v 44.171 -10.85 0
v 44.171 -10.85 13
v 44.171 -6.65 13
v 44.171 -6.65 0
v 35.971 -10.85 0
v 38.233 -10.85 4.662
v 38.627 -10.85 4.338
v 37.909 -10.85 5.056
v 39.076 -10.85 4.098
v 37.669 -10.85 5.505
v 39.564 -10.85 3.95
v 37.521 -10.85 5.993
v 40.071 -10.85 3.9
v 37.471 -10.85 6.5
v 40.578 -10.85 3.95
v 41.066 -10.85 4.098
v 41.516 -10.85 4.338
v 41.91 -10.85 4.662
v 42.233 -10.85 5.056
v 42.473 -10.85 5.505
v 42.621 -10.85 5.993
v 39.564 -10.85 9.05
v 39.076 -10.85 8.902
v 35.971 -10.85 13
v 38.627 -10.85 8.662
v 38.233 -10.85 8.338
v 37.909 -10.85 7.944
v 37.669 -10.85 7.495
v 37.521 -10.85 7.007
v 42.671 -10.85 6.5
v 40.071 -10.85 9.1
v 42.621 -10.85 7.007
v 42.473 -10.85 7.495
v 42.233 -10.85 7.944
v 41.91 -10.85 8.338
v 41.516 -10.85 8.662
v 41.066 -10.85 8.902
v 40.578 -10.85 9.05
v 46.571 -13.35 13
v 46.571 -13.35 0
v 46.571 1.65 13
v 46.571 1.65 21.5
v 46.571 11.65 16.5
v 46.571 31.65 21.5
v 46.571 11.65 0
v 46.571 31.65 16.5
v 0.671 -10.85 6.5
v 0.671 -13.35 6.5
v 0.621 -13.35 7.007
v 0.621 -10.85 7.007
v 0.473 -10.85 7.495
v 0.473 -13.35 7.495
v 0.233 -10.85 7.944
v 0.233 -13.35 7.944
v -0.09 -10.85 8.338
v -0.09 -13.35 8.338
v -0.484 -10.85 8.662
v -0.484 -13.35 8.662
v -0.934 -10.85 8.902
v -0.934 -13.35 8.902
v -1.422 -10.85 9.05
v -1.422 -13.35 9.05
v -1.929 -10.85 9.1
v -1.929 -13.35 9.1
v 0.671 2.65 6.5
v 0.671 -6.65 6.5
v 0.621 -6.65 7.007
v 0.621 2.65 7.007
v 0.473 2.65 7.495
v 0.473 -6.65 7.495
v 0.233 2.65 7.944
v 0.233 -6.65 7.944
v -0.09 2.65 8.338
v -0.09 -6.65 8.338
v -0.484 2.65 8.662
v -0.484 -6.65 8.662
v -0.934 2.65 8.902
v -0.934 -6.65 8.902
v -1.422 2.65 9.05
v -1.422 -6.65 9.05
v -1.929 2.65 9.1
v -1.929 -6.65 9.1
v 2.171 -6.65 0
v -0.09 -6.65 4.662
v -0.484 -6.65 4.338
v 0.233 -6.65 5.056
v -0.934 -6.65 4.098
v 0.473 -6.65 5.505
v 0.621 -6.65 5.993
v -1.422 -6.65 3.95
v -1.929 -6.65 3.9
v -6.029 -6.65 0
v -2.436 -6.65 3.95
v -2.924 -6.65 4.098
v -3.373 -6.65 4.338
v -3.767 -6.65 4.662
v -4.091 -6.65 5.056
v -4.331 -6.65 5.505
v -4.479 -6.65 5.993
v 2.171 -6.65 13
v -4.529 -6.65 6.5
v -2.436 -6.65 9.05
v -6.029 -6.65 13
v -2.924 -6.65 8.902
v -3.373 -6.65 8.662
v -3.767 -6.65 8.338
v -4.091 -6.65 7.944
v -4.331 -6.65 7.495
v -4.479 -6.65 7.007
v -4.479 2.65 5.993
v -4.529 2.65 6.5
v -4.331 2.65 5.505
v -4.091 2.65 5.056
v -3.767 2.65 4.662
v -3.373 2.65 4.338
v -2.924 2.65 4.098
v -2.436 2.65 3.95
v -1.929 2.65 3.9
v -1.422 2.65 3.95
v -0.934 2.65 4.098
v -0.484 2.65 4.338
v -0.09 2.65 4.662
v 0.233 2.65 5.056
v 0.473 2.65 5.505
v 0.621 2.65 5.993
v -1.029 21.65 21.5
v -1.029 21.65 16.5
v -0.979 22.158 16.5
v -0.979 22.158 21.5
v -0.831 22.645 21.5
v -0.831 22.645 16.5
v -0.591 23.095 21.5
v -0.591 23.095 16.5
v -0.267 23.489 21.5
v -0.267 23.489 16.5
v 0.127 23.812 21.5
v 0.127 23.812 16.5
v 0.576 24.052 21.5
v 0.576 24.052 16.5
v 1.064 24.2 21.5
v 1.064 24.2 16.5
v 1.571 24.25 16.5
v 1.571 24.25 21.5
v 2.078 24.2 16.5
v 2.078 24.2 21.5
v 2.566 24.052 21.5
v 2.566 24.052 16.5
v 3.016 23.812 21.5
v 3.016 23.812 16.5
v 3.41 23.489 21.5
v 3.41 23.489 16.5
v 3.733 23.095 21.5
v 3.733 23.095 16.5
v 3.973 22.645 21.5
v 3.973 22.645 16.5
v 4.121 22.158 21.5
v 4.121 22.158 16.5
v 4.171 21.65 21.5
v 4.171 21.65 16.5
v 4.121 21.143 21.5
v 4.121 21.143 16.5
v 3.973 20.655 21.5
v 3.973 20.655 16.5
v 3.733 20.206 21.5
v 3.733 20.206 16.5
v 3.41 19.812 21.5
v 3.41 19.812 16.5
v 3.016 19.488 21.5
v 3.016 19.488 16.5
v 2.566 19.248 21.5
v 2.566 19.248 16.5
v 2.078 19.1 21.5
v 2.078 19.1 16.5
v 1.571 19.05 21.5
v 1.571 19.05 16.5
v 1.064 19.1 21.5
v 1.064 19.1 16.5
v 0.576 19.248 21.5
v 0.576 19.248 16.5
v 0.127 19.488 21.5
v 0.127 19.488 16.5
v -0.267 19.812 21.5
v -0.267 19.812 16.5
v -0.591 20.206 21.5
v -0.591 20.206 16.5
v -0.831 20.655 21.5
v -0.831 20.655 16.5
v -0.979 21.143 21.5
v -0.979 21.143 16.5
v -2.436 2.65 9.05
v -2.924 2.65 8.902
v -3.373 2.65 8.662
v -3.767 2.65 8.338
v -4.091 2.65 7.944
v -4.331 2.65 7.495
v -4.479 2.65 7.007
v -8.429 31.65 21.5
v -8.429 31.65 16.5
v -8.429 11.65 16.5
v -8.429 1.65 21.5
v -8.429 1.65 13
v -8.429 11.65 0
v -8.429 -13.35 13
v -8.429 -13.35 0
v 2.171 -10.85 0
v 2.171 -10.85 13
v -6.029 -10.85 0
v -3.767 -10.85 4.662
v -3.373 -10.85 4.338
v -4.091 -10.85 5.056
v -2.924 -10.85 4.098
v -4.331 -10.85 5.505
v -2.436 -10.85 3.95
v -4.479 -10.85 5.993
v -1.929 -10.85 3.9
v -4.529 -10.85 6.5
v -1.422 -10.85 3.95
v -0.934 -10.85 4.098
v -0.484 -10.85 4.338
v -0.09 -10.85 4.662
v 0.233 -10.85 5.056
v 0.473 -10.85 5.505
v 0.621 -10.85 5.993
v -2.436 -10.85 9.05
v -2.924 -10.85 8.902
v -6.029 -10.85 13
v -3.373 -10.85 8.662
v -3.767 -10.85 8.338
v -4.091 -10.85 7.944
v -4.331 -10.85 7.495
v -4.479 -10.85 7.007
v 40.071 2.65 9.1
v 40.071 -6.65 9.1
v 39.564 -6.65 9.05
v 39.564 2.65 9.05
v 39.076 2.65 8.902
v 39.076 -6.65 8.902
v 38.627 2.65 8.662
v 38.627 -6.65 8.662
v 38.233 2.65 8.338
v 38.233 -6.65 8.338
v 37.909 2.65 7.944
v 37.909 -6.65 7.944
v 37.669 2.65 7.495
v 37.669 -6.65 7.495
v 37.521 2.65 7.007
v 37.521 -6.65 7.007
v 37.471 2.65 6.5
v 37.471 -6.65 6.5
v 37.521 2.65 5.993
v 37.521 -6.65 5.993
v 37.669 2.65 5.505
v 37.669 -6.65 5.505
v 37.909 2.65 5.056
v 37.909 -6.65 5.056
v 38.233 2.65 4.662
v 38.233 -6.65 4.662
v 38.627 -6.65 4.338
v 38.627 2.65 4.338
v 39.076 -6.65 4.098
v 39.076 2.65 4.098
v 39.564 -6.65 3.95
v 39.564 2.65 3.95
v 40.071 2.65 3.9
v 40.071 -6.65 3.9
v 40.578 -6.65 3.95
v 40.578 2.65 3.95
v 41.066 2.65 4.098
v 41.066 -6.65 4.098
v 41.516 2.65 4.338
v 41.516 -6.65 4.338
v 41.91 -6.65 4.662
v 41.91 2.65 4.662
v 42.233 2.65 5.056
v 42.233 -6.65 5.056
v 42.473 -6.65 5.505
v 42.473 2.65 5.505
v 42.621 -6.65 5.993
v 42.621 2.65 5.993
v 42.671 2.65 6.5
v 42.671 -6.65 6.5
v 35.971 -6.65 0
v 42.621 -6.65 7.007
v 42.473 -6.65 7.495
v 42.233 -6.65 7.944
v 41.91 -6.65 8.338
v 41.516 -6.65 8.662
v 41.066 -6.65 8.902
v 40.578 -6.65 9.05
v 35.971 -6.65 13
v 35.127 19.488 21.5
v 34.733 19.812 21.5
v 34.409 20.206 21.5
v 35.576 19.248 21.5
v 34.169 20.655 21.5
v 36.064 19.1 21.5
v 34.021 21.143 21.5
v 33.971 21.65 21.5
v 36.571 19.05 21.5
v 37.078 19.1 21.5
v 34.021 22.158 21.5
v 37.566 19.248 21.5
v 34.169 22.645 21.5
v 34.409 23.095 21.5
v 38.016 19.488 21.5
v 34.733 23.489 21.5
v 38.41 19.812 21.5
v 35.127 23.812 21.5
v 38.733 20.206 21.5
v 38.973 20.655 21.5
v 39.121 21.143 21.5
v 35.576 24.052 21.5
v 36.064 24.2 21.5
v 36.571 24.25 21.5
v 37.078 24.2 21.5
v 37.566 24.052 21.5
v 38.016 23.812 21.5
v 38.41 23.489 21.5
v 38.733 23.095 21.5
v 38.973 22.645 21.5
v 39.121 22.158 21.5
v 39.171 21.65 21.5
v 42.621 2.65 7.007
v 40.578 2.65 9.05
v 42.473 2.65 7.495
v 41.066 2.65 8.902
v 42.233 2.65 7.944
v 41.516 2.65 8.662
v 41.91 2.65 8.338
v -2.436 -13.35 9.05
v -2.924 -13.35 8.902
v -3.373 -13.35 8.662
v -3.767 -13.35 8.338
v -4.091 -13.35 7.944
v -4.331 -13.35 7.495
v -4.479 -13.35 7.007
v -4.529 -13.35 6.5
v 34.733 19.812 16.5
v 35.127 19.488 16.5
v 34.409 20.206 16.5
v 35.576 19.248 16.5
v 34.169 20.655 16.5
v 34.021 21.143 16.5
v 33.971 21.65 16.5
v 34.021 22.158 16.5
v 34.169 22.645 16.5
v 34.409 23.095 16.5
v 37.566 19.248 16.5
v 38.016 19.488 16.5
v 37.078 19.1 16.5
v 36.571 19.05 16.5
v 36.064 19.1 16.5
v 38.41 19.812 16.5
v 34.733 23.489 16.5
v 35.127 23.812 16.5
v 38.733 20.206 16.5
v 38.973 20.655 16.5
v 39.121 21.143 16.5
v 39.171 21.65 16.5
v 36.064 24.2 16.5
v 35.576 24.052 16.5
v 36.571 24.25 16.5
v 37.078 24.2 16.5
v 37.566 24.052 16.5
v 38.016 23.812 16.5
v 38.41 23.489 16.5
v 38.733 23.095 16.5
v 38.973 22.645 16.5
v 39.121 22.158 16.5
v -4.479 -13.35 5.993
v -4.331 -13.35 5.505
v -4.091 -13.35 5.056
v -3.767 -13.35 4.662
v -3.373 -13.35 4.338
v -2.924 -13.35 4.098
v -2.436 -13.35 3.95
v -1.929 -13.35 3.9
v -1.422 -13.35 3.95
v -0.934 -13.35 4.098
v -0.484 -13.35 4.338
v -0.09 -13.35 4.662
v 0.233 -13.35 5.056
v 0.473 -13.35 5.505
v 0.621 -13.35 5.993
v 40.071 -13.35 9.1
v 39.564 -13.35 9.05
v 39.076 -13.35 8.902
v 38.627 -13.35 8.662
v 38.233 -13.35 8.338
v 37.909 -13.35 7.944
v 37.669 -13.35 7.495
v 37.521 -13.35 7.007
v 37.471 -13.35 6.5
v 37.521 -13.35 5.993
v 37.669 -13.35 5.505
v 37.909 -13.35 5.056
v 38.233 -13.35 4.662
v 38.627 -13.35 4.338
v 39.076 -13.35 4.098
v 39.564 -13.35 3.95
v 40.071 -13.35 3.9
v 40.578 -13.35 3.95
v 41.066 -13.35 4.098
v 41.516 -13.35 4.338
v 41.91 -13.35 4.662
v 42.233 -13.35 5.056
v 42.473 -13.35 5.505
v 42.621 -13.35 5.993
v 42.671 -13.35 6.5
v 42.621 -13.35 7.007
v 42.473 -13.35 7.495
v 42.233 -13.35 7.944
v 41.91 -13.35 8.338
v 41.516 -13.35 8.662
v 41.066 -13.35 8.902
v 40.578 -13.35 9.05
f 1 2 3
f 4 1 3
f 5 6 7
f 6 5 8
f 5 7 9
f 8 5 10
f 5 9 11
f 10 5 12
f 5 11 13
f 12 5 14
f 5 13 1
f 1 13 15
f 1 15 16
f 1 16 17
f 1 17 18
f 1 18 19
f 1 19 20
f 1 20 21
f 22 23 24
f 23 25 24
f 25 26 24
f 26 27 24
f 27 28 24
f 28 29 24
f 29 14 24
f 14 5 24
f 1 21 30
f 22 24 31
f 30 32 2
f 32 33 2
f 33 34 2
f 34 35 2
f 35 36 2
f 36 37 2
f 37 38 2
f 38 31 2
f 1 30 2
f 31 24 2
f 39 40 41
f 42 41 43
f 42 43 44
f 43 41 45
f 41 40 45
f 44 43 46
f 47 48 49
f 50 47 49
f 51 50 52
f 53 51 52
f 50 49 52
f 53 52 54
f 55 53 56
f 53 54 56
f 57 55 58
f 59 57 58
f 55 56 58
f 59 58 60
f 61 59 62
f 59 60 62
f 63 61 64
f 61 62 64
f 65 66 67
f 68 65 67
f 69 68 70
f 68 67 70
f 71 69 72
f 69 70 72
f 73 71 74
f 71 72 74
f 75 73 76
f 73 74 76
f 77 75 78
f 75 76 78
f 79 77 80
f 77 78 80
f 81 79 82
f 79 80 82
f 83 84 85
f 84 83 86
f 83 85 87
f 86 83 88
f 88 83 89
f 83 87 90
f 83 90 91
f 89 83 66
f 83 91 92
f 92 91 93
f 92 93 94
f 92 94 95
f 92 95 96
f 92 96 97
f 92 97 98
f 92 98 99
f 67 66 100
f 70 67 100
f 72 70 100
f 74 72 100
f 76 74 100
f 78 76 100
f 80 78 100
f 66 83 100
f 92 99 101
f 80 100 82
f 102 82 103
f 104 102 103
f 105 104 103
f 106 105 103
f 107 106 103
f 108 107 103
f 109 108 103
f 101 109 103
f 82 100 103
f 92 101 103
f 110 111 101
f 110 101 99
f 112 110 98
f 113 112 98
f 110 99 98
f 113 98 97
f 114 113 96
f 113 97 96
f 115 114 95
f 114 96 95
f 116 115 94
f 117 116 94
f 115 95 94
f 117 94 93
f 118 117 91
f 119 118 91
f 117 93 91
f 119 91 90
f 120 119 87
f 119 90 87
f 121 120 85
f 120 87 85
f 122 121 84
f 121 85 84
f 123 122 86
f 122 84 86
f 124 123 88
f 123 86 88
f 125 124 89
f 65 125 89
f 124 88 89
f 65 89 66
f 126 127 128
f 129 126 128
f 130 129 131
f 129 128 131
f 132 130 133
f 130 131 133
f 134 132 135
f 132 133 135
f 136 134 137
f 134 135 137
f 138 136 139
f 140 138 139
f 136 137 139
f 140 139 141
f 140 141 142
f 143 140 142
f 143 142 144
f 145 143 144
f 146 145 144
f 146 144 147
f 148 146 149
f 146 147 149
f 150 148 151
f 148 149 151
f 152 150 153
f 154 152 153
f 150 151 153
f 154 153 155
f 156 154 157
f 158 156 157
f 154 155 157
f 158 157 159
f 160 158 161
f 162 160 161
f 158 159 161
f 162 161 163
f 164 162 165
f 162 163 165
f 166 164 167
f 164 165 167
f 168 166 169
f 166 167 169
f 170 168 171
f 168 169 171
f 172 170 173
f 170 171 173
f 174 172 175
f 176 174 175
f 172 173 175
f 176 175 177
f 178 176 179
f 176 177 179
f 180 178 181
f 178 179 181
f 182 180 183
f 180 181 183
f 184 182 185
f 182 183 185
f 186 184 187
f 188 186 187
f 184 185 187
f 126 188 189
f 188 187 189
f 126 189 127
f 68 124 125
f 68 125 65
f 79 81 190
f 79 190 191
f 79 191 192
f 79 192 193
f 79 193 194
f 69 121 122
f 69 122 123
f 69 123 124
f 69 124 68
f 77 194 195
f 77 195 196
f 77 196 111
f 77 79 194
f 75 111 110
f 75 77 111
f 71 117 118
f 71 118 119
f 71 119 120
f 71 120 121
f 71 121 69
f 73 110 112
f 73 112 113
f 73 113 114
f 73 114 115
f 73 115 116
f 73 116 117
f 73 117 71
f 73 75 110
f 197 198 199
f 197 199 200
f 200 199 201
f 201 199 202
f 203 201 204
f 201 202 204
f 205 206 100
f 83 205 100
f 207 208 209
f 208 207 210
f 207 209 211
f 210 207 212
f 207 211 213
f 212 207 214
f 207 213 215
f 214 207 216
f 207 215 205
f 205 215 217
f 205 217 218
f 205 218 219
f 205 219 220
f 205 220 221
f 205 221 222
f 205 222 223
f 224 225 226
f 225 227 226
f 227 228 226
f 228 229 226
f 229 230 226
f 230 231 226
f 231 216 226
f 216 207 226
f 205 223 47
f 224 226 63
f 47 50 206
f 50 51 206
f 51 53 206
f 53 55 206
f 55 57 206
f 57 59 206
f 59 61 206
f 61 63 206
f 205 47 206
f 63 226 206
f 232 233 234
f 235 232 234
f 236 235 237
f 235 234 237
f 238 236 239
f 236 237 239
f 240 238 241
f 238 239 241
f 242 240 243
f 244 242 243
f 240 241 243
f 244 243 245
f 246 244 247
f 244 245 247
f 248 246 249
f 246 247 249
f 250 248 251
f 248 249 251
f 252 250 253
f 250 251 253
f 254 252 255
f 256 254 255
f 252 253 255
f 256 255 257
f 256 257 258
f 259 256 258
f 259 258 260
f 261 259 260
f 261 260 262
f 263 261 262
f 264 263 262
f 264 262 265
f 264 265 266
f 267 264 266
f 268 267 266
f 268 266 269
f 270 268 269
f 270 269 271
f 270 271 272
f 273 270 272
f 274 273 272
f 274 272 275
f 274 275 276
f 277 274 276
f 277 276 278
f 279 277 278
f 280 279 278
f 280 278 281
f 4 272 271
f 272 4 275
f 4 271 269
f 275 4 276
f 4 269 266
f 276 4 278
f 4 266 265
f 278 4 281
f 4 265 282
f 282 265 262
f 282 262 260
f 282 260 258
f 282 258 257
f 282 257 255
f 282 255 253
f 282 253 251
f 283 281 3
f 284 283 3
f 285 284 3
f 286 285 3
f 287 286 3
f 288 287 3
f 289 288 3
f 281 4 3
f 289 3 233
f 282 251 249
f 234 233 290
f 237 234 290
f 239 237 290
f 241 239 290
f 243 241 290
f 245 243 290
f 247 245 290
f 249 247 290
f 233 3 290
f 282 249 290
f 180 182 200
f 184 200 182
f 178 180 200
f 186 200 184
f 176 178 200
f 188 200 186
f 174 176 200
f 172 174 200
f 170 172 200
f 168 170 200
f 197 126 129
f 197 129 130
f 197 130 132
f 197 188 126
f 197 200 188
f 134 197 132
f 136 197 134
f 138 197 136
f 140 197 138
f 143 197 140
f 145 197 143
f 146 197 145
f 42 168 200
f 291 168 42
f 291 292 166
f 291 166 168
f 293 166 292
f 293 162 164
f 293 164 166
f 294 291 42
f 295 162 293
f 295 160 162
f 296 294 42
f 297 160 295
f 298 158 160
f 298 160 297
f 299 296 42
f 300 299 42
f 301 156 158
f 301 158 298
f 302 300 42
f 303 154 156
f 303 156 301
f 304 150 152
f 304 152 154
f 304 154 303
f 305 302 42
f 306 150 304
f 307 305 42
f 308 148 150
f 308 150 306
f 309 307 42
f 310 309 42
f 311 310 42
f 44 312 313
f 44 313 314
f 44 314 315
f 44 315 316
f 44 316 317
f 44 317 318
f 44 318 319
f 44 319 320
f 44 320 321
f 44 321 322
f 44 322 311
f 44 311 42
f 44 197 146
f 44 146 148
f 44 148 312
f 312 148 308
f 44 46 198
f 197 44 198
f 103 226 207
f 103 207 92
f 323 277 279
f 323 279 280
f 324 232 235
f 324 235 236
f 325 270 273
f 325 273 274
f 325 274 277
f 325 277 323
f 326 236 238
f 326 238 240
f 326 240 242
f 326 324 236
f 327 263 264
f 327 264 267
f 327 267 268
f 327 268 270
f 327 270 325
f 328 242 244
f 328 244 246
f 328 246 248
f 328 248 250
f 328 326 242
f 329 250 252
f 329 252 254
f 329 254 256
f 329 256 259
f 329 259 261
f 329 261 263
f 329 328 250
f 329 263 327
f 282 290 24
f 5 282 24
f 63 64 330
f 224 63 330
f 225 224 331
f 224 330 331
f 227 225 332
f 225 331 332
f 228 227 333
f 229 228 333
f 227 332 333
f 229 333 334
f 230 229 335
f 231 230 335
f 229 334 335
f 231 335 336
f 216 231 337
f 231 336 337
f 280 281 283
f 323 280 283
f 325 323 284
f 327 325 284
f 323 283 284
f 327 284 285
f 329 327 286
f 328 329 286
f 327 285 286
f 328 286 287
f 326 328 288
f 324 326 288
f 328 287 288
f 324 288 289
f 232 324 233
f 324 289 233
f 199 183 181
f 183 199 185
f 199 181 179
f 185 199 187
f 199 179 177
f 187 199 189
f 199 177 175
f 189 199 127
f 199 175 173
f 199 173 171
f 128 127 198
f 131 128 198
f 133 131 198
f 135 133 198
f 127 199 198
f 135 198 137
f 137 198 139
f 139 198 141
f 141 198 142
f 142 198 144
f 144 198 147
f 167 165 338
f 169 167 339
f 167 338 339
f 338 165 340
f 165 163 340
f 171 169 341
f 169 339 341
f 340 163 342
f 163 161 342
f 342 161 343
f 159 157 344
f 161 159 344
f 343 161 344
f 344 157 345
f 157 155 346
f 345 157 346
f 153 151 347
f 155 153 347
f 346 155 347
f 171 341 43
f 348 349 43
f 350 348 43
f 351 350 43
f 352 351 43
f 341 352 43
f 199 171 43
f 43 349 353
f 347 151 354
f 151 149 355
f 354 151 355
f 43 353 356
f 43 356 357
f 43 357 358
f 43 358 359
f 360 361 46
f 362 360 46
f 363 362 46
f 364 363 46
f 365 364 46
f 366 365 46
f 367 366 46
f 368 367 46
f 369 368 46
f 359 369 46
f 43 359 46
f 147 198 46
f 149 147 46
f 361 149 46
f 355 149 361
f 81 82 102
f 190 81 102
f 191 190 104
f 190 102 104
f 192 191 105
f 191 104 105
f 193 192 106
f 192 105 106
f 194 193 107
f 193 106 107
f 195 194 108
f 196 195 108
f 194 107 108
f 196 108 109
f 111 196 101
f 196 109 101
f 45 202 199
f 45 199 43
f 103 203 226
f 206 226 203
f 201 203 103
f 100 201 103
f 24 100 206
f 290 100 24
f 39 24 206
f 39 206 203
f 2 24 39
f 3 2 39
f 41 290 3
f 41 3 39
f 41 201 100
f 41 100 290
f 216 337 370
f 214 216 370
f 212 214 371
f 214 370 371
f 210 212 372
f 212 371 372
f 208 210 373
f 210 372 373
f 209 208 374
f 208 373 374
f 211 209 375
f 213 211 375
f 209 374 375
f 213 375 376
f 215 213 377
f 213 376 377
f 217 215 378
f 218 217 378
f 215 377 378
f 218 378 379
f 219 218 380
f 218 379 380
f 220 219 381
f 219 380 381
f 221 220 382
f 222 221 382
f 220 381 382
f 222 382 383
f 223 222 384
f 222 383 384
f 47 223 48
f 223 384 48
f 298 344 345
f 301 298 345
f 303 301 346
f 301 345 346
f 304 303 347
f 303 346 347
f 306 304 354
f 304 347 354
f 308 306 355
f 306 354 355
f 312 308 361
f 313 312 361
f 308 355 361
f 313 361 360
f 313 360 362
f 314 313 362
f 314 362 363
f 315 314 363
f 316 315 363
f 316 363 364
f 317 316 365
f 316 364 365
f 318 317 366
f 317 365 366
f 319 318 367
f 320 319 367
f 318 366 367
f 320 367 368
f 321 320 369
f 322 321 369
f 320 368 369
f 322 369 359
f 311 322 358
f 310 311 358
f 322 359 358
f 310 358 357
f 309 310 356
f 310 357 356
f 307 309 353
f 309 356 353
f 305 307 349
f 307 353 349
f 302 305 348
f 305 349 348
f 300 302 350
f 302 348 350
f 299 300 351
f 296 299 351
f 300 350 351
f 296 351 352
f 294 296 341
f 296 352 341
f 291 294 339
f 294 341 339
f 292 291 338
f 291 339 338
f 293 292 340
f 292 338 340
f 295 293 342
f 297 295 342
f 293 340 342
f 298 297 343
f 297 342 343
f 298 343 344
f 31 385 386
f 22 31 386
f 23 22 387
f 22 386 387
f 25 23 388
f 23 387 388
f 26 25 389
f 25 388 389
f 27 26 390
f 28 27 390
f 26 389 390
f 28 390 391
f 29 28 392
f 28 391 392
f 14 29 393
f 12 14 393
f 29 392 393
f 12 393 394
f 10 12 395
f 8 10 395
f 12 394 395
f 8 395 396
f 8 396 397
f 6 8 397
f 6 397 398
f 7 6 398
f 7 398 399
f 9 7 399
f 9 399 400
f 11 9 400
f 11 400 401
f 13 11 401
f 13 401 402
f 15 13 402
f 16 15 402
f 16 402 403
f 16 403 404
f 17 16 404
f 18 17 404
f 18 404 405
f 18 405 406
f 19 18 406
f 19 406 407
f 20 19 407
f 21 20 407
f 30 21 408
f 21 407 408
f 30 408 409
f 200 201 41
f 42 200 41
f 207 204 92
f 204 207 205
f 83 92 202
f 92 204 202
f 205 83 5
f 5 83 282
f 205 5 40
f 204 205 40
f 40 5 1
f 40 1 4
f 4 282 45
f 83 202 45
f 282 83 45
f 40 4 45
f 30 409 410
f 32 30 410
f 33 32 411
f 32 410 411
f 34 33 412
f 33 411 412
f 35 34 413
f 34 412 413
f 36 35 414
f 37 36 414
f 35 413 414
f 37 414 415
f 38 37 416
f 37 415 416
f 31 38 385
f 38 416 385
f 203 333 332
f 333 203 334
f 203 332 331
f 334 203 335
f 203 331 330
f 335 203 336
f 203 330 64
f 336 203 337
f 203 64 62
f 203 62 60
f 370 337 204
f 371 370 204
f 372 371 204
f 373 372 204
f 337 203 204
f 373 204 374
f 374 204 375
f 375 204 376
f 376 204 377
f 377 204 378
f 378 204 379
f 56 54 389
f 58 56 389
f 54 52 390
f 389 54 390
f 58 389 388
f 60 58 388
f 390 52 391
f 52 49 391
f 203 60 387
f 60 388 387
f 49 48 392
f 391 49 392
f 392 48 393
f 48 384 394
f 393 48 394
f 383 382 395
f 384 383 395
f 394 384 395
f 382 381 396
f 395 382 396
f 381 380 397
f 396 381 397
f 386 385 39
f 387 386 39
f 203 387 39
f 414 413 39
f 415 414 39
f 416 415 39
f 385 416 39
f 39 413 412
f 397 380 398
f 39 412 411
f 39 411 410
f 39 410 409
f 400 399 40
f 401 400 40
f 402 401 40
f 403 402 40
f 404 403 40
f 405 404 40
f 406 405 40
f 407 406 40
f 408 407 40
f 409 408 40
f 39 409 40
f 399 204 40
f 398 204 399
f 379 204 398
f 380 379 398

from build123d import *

# Parameters (mm, degrees)
F0_W     = 55
F0_H     = 25
F1_DEPTH = 13
F3_DEPTH = 16
F4_W     = 4.1
F4_H     = 4.2
F5_DEPTH = 31.6
F6_W     = 55
F6_H     = 10
F7_DEPTH = 5
F8_DEPTH = 3.5
F9_DEPTH = 3.5


with BuildPart() as f1:
    # F0 (on Top) → F1 (new body)
    with BuildSketch(Plane.XY):
        with Locations((19.0712029868, -0.8496874943)):
            Rectangle(F0_W, F0_H)
    extrude(amount=F1_DEPTH)

    # F2 (on face) → F3 (cut)
    with BuildSketch(Plane.XZ.offset(13.3496874943)):
        with BuildLine():
            Line((-1.9287970132, 6.5), (-1.9287970132, 9.1))
            ThreePointArc((-1.9287970132, 9.1), (-3.7672746443, 8.3384776311), (-4.5287970132, 6.5))
            Line((-4.5287970132, 6.5), (-1.9287970132, 6.5))
        make_face()
        with BuildLine():
            ThreePointArc((0.6712029868, 6.5), (-0.0903193822, 8.3384776311), (-1.9287970132, 9.1))
            Line((-1.9287970132, 9.1), (-1.9287970132, 6.5))
            Line((-1.9287970132, 6.5), (-4.5287970132, 6.5))
            ThreePointArc((-4.5287970132, 6.5), (-1.9287970132, 3.9), (0.6712029868, 6.5))
        make_face()
        with BuildLine():
            ThreePointArc((42.6712029868, 6.5), (41.9096806178, 8.3384776311), (40.0712029868, 9.1))
            Line((40.0712029868, 9.1), (40.0712029868, 6.5))
            Line((40.0712029868, 6.5), (42.6712029868, 6.5))
        make_face()
        with BuildLine():
            Line((40.0712029868, 6.5), (40.0712029868, 9.1))
            ThreePointArc((40.0712029868, 9.1), (38.2327253557, 4.6615223689), (42.6712029868, 6.5))
            Line((42.6712029868, 6.5), (40.0712029868, 6.5))
        make_face()
    extrude(amount=-F3_DEPTH, mode=Mode.SUBTRACT)

    # F4 (on face) → F5 (cut)
    with BuildSketch(Plane.XY.offset(13)):
        Polygon((35.9712029868, -6.6496874943), (35.9712029868, -10.8496874943), (40.0712029868, -10.8496874943), (44.1712029868, -10.8496874943), (44.1712029868, -6.6496874943), (40.0712029868, -6.6496874943), align=None)
        with Locations((0.1212029868, -8.7496874943)):
            Rectangle(F4_W, F4_H)
        with Locations((-3.9787970132, -8.7496874943)):
            Rectangle(F4_W, F4_H)
    extrude(amount=-F5_DEPTH, mode=Mode.SUBTRACT)

    # F6 (on face) → F7 (join)
    with BuildSketch(Plane.XY.offset(13)):
        with BuildLine():
            Line((-8.4287970132, 21.6503125057), (-8.4287970132, 11.6503125057))
            Line((-8.4287970132, 11.6503125057), (46.5712029868, 11.6503125057))
            Line((46.5712029868, 11.6503125057), (46.5712029868, 21.6503125057))
            Line((46.5712029868, 21.6503125057), (39.1712029868, 21.6503125057))
            ThreePointArc((39.1712029868, 21.6503125057), (36.5712029868, 19.0503125057), (33.9712029868, 21.6503125057))
            Line((33.9712029868, 21.6503125057), (4.1712029868, 21.6503125057))
            ThreePointArc((4.1712029868, 21.6503125057), (1.5712029868, 19.0503125057), (-1.0287970132, 21.6503125057))
            Line((-1.0287970132, 21.6503125057), (-8.4287970132, 21.6503125057))
        make_face()
        with Locations((19.0712029868, 6.6503125057)):
            Rectangle(F6_W, F6_H)
        with BuildLine():
            Line((-8.4287970132, 31.6503125057), (-8.4287970132, 21.6503125057))
            Line((-8.4287970132, 21.6503125057), (-1.0287970132, 21.6503125057))
            ThreePointArc((-1.0287970132, 21.6503125057), (1.5712029868, 24.2503125057), (4.1712029868, 21.6503125057))
            Line((4.1712029868, 21.6503125057), (33.9712029868, 21.6503125057))
            ThreePointArc((33.9712029868, 21.6503125057), (36.5712029868, 24.2503125057), (39.1712029868, 21.6503125057))
            Line((39.1712029868, 21.6503125057), (46.5712029868, 21.6503125057))
            Line((46.5712029868, 21.6503125057), (46.5712029868, 31.6503125057))
            Line((46.5712029868, 31.6503125057), (-8.4287970132, 31.6503125057))
        make_face()
    extrude(amount=F7_DEPTH)

    # F8 (add): a face of the model
    f8_faces = [f1.faces().sort_by_distance(p)[0] for p in [
        (19.0712029868, 16.5182016052, 18),
    ]]
    extrude(f8_faces, amount=F8_DEPTH)

    # F9 (cut): a face of the model
    f9_faces = [f1.faces().sort_by_distance(p)[0] for p in [
        (19.0712029868, 21.6503125057, 13),
    ]]
    extrude(f9_faces, amount=-F9_DEPTH, mode=Mode.SUBTRACT)


solid = f1.part
